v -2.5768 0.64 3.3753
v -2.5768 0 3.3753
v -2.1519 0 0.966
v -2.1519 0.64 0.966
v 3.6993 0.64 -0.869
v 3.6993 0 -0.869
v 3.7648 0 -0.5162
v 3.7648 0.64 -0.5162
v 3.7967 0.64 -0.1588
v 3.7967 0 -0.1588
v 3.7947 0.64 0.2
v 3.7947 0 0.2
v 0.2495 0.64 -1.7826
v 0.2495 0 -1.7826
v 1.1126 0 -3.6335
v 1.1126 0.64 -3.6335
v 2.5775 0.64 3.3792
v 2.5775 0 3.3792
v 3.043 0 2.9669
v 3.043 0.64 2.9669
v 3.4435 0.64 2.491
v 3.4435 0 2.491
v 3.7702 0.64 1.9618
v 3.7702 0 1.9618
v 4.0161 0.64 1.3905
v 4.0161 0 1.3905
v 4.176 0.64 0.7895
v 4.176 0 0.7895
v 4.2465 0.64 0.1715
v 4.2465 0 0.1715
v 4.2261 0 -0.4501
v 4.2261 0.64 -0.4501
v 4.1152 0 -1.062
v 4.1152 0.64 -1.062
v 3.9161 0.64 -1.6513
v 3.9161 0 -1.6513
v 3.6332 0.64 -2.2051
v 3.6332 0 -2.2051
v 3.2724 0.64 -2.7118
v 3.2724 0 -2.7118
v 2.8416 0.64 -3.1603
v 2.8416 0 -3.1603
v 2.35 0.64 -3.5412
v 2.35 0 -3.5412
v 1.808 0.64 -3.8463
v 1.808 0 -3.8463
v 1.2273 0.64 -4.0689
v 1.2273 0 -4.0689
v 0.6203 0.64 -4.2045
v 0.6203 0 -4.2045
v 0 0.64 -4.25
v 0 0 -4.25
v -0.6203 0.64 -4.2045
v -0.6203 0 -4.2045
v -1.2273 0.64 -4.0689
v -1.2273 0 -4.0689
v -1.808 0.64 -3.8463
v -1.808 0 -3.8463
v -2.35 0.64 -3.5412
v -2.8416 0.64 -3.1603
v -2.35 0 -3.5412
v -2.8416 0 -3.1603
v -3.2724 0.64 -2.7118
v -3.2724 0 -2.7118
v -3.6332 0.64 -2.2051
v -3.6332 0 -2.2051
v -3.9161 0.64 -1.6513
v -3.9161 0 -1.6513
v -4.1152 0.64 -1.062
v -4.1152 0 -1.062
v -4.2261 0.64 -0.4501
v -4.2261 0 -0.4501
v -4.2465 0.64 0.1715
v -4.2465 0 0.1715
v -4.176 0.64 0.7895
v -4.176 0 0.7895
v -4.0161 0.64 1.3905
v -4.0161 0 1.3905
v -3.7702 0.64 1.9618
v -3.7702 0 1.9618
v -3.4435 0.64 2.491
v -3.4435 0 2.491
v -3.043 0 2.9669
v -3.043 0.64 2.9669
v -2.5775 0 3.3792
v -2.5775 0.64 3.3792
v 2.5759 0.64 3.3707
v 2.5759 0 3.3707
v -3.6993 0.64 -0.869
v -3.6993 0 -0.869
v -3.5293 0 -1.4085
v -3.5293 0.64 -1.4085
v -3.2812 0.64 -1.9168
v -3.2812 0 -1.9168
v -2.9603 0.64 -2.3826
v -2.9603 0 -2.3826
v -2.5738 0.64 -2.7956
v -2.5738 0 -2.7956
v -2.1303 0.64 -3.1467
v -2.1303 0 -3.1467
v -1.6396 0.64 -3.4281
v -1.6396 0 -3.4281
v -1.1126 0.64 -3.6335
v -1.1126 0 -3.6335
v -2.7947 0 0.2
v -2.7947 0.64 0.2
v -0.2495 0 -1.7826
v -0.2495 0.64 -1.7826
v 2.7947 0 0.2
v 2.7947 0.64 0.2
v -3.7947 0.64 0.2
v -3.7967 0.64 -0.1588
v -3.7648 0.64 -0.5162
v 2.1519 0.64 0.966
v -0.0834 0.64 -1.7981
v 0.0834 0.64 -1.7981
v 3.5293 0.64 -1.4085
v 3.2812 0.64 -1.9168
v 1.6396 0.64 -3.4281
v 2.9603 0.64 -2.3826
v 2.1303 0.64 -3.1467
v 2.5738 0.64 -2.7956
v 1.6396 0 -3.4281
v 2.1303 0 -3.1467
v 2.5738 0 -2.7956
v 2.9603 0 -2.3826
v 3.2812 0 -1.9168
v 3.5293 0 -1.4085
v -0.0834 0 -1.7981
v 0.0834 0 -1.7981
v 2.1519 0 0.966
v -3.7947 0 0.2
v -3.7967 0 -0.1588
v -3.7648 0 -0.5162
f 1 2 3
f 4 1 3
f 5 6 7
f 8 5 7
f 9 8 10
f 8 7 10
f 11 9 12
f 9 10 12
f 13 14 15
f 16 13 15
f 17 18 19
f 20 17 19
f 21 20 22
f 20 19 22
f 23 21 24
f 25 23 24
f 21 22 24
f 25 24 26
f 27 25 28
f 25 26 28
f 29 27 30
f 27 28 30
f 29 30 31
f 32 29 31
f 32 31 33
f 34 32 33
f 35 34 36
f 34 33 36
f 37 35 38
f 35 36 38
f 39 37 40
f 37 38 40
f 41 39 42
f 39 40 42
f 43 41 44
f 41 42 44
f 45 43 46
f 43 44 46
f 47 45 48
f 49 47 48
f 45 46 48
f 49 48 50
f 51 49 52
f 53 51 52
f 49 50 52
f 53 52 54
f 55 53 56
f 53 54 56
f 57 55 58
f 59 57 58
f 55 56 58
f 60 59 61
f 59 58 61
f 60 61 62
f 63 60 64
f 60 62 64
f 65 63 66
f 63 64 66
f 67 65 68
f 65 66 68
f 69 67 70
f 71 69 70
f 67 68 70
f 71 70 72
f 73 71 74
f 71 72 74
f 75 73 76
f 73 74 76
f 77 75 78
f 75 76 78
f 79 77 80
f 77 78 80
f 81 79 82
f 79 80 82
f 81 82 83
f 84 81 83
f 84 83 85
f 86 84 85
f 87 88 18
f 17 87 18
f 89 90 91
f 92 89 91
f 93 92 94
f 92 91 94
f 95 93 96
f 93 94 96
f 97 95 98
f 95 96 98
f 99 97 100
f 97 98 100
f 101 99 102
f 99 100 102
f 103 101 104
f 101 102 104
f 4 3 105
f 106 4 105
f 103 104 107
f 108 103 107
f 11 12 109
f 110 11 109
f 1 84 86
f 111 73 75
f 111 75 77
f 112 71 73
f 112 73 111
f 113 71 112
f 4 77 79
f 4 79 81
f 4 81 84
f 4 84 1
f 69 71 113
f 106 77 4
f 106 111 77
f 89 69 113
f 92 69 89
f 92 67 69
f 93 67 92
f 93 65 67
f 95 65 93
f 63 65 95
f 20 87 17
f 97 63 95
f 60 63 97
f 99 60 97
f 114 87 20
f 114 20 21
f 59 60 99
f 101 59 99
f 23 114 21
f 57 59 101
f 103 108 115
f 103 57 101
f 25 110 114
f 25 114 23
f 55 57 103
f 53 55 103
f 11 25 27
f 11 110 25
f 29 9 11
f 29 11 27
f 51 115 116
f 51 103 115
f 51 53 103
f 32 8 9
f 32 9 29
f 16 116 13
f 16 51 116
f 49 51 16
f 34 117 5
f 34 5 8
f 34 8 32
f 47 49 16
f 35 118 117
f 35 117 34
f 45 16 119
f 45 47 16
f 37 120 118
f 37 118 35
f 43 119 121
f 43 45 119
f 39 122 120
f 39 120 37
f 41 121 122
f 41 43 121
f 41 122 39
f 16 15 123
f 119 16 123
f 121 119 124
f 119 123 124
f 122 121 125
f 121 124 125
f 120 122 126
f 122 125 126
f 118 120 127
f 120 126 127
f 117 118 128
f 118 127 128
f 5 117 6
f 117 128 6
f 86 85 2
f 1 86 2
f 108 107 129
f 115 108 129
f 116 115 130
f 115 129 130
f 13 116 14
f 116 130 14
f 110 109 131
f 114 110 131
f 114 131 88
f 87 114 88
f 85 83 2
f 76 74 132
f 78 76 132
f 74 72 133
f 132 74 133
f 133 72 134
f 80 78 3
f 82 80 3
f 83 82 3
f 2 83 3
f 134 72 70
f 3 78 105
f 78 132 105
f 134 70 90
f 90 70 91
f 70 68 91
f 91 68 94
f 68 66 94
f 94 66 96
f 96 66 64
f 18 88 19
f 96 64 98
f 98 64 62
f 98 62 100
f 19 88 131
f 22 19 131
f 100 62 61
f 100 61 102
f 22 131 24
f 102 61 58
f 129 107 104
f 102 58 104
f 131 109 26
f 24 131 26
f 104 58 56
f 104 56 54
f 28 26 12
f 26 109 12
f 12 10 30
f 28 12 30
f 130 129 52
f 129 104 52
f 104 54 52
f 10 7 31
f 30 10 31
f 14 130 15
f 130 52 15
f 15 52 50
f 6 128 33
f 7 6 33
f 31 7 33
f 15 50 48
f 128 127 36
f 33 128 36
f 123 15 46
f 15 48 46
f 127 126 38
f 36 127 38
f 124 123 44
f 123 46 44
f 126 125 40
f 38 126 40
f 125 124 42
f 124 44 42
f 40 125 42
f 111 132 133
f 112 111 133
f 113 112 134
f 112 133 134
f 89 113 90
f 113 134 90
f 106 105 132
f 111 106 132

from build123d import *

# Parameters (mm, degrees)
BOSS_EXTRUDE1_DEPTH = 0.64


with BuildPart() as part:
    # Sketch1 → Boss-Extrude1 (new body)
    with BuildSketch(Plane(origin=(0, 0, 0), x_dir=(1, 0, 0), z_dir=(0, 1, 0))):
        with BuildLine():
            Line((-1.112579474, 3.633478624), (-0.249511241, 1.782622826))
            ThreePointArc((-0.249511241, 1.782622826), (0, 1.8), (0.249511241, 1.782622826))
            Line((0.249511241, 1.782622826), (1.112579474, 3.633478624))
            ThreePointArc((1.112579474, 3.633478624), (2.774739275, 2.596309295), (3.699307386, 0.868979208))
            ThreePointArc((3.699307386, 0.868979208), (3.784949165, 0.337875445), (3.794733192, -0.2))
            Line((3.794733192, -0.2), (2.794733192, -0.2))
            Line((2.794733192, -0.2), (2.151945583, -0.966044443))
            Line((2.151945583, -0.966044443), (2.57594692, -3.370675522))
            Line((2.57594692, -3.370675522), (2.577455967, -3.37923375))
            ThreePointArc((2.577455967, -3.37923375), (0, 4.25), (-2.577455967, -3.37923375))
            Line((-2.577455967, -3.37923375), (-2.576768139, -3.375332886))
            Line((-2.576768139, -3.375332886), (-2.151945583, -0.966044443))
            Line((-2.151945583, -0.966044443), (-2.794733192, -0.2))
            Line((-2.794733192, -0.2), (-3.794733192, -0.2))
            ThreePointArc((-3.794733192, -0.2), (-3.784949165, 0.337875445), (-3.699307386, 0.868979208))
            ThreePointArc((-3.699307386, 0.868979208), (-2.774739275, 2.596309295), (-1.112579474, 3.633478624))
        make_face()
    extrude(amount=BOSS_EXTRUDE1_DEPTH)


solid = part.part
